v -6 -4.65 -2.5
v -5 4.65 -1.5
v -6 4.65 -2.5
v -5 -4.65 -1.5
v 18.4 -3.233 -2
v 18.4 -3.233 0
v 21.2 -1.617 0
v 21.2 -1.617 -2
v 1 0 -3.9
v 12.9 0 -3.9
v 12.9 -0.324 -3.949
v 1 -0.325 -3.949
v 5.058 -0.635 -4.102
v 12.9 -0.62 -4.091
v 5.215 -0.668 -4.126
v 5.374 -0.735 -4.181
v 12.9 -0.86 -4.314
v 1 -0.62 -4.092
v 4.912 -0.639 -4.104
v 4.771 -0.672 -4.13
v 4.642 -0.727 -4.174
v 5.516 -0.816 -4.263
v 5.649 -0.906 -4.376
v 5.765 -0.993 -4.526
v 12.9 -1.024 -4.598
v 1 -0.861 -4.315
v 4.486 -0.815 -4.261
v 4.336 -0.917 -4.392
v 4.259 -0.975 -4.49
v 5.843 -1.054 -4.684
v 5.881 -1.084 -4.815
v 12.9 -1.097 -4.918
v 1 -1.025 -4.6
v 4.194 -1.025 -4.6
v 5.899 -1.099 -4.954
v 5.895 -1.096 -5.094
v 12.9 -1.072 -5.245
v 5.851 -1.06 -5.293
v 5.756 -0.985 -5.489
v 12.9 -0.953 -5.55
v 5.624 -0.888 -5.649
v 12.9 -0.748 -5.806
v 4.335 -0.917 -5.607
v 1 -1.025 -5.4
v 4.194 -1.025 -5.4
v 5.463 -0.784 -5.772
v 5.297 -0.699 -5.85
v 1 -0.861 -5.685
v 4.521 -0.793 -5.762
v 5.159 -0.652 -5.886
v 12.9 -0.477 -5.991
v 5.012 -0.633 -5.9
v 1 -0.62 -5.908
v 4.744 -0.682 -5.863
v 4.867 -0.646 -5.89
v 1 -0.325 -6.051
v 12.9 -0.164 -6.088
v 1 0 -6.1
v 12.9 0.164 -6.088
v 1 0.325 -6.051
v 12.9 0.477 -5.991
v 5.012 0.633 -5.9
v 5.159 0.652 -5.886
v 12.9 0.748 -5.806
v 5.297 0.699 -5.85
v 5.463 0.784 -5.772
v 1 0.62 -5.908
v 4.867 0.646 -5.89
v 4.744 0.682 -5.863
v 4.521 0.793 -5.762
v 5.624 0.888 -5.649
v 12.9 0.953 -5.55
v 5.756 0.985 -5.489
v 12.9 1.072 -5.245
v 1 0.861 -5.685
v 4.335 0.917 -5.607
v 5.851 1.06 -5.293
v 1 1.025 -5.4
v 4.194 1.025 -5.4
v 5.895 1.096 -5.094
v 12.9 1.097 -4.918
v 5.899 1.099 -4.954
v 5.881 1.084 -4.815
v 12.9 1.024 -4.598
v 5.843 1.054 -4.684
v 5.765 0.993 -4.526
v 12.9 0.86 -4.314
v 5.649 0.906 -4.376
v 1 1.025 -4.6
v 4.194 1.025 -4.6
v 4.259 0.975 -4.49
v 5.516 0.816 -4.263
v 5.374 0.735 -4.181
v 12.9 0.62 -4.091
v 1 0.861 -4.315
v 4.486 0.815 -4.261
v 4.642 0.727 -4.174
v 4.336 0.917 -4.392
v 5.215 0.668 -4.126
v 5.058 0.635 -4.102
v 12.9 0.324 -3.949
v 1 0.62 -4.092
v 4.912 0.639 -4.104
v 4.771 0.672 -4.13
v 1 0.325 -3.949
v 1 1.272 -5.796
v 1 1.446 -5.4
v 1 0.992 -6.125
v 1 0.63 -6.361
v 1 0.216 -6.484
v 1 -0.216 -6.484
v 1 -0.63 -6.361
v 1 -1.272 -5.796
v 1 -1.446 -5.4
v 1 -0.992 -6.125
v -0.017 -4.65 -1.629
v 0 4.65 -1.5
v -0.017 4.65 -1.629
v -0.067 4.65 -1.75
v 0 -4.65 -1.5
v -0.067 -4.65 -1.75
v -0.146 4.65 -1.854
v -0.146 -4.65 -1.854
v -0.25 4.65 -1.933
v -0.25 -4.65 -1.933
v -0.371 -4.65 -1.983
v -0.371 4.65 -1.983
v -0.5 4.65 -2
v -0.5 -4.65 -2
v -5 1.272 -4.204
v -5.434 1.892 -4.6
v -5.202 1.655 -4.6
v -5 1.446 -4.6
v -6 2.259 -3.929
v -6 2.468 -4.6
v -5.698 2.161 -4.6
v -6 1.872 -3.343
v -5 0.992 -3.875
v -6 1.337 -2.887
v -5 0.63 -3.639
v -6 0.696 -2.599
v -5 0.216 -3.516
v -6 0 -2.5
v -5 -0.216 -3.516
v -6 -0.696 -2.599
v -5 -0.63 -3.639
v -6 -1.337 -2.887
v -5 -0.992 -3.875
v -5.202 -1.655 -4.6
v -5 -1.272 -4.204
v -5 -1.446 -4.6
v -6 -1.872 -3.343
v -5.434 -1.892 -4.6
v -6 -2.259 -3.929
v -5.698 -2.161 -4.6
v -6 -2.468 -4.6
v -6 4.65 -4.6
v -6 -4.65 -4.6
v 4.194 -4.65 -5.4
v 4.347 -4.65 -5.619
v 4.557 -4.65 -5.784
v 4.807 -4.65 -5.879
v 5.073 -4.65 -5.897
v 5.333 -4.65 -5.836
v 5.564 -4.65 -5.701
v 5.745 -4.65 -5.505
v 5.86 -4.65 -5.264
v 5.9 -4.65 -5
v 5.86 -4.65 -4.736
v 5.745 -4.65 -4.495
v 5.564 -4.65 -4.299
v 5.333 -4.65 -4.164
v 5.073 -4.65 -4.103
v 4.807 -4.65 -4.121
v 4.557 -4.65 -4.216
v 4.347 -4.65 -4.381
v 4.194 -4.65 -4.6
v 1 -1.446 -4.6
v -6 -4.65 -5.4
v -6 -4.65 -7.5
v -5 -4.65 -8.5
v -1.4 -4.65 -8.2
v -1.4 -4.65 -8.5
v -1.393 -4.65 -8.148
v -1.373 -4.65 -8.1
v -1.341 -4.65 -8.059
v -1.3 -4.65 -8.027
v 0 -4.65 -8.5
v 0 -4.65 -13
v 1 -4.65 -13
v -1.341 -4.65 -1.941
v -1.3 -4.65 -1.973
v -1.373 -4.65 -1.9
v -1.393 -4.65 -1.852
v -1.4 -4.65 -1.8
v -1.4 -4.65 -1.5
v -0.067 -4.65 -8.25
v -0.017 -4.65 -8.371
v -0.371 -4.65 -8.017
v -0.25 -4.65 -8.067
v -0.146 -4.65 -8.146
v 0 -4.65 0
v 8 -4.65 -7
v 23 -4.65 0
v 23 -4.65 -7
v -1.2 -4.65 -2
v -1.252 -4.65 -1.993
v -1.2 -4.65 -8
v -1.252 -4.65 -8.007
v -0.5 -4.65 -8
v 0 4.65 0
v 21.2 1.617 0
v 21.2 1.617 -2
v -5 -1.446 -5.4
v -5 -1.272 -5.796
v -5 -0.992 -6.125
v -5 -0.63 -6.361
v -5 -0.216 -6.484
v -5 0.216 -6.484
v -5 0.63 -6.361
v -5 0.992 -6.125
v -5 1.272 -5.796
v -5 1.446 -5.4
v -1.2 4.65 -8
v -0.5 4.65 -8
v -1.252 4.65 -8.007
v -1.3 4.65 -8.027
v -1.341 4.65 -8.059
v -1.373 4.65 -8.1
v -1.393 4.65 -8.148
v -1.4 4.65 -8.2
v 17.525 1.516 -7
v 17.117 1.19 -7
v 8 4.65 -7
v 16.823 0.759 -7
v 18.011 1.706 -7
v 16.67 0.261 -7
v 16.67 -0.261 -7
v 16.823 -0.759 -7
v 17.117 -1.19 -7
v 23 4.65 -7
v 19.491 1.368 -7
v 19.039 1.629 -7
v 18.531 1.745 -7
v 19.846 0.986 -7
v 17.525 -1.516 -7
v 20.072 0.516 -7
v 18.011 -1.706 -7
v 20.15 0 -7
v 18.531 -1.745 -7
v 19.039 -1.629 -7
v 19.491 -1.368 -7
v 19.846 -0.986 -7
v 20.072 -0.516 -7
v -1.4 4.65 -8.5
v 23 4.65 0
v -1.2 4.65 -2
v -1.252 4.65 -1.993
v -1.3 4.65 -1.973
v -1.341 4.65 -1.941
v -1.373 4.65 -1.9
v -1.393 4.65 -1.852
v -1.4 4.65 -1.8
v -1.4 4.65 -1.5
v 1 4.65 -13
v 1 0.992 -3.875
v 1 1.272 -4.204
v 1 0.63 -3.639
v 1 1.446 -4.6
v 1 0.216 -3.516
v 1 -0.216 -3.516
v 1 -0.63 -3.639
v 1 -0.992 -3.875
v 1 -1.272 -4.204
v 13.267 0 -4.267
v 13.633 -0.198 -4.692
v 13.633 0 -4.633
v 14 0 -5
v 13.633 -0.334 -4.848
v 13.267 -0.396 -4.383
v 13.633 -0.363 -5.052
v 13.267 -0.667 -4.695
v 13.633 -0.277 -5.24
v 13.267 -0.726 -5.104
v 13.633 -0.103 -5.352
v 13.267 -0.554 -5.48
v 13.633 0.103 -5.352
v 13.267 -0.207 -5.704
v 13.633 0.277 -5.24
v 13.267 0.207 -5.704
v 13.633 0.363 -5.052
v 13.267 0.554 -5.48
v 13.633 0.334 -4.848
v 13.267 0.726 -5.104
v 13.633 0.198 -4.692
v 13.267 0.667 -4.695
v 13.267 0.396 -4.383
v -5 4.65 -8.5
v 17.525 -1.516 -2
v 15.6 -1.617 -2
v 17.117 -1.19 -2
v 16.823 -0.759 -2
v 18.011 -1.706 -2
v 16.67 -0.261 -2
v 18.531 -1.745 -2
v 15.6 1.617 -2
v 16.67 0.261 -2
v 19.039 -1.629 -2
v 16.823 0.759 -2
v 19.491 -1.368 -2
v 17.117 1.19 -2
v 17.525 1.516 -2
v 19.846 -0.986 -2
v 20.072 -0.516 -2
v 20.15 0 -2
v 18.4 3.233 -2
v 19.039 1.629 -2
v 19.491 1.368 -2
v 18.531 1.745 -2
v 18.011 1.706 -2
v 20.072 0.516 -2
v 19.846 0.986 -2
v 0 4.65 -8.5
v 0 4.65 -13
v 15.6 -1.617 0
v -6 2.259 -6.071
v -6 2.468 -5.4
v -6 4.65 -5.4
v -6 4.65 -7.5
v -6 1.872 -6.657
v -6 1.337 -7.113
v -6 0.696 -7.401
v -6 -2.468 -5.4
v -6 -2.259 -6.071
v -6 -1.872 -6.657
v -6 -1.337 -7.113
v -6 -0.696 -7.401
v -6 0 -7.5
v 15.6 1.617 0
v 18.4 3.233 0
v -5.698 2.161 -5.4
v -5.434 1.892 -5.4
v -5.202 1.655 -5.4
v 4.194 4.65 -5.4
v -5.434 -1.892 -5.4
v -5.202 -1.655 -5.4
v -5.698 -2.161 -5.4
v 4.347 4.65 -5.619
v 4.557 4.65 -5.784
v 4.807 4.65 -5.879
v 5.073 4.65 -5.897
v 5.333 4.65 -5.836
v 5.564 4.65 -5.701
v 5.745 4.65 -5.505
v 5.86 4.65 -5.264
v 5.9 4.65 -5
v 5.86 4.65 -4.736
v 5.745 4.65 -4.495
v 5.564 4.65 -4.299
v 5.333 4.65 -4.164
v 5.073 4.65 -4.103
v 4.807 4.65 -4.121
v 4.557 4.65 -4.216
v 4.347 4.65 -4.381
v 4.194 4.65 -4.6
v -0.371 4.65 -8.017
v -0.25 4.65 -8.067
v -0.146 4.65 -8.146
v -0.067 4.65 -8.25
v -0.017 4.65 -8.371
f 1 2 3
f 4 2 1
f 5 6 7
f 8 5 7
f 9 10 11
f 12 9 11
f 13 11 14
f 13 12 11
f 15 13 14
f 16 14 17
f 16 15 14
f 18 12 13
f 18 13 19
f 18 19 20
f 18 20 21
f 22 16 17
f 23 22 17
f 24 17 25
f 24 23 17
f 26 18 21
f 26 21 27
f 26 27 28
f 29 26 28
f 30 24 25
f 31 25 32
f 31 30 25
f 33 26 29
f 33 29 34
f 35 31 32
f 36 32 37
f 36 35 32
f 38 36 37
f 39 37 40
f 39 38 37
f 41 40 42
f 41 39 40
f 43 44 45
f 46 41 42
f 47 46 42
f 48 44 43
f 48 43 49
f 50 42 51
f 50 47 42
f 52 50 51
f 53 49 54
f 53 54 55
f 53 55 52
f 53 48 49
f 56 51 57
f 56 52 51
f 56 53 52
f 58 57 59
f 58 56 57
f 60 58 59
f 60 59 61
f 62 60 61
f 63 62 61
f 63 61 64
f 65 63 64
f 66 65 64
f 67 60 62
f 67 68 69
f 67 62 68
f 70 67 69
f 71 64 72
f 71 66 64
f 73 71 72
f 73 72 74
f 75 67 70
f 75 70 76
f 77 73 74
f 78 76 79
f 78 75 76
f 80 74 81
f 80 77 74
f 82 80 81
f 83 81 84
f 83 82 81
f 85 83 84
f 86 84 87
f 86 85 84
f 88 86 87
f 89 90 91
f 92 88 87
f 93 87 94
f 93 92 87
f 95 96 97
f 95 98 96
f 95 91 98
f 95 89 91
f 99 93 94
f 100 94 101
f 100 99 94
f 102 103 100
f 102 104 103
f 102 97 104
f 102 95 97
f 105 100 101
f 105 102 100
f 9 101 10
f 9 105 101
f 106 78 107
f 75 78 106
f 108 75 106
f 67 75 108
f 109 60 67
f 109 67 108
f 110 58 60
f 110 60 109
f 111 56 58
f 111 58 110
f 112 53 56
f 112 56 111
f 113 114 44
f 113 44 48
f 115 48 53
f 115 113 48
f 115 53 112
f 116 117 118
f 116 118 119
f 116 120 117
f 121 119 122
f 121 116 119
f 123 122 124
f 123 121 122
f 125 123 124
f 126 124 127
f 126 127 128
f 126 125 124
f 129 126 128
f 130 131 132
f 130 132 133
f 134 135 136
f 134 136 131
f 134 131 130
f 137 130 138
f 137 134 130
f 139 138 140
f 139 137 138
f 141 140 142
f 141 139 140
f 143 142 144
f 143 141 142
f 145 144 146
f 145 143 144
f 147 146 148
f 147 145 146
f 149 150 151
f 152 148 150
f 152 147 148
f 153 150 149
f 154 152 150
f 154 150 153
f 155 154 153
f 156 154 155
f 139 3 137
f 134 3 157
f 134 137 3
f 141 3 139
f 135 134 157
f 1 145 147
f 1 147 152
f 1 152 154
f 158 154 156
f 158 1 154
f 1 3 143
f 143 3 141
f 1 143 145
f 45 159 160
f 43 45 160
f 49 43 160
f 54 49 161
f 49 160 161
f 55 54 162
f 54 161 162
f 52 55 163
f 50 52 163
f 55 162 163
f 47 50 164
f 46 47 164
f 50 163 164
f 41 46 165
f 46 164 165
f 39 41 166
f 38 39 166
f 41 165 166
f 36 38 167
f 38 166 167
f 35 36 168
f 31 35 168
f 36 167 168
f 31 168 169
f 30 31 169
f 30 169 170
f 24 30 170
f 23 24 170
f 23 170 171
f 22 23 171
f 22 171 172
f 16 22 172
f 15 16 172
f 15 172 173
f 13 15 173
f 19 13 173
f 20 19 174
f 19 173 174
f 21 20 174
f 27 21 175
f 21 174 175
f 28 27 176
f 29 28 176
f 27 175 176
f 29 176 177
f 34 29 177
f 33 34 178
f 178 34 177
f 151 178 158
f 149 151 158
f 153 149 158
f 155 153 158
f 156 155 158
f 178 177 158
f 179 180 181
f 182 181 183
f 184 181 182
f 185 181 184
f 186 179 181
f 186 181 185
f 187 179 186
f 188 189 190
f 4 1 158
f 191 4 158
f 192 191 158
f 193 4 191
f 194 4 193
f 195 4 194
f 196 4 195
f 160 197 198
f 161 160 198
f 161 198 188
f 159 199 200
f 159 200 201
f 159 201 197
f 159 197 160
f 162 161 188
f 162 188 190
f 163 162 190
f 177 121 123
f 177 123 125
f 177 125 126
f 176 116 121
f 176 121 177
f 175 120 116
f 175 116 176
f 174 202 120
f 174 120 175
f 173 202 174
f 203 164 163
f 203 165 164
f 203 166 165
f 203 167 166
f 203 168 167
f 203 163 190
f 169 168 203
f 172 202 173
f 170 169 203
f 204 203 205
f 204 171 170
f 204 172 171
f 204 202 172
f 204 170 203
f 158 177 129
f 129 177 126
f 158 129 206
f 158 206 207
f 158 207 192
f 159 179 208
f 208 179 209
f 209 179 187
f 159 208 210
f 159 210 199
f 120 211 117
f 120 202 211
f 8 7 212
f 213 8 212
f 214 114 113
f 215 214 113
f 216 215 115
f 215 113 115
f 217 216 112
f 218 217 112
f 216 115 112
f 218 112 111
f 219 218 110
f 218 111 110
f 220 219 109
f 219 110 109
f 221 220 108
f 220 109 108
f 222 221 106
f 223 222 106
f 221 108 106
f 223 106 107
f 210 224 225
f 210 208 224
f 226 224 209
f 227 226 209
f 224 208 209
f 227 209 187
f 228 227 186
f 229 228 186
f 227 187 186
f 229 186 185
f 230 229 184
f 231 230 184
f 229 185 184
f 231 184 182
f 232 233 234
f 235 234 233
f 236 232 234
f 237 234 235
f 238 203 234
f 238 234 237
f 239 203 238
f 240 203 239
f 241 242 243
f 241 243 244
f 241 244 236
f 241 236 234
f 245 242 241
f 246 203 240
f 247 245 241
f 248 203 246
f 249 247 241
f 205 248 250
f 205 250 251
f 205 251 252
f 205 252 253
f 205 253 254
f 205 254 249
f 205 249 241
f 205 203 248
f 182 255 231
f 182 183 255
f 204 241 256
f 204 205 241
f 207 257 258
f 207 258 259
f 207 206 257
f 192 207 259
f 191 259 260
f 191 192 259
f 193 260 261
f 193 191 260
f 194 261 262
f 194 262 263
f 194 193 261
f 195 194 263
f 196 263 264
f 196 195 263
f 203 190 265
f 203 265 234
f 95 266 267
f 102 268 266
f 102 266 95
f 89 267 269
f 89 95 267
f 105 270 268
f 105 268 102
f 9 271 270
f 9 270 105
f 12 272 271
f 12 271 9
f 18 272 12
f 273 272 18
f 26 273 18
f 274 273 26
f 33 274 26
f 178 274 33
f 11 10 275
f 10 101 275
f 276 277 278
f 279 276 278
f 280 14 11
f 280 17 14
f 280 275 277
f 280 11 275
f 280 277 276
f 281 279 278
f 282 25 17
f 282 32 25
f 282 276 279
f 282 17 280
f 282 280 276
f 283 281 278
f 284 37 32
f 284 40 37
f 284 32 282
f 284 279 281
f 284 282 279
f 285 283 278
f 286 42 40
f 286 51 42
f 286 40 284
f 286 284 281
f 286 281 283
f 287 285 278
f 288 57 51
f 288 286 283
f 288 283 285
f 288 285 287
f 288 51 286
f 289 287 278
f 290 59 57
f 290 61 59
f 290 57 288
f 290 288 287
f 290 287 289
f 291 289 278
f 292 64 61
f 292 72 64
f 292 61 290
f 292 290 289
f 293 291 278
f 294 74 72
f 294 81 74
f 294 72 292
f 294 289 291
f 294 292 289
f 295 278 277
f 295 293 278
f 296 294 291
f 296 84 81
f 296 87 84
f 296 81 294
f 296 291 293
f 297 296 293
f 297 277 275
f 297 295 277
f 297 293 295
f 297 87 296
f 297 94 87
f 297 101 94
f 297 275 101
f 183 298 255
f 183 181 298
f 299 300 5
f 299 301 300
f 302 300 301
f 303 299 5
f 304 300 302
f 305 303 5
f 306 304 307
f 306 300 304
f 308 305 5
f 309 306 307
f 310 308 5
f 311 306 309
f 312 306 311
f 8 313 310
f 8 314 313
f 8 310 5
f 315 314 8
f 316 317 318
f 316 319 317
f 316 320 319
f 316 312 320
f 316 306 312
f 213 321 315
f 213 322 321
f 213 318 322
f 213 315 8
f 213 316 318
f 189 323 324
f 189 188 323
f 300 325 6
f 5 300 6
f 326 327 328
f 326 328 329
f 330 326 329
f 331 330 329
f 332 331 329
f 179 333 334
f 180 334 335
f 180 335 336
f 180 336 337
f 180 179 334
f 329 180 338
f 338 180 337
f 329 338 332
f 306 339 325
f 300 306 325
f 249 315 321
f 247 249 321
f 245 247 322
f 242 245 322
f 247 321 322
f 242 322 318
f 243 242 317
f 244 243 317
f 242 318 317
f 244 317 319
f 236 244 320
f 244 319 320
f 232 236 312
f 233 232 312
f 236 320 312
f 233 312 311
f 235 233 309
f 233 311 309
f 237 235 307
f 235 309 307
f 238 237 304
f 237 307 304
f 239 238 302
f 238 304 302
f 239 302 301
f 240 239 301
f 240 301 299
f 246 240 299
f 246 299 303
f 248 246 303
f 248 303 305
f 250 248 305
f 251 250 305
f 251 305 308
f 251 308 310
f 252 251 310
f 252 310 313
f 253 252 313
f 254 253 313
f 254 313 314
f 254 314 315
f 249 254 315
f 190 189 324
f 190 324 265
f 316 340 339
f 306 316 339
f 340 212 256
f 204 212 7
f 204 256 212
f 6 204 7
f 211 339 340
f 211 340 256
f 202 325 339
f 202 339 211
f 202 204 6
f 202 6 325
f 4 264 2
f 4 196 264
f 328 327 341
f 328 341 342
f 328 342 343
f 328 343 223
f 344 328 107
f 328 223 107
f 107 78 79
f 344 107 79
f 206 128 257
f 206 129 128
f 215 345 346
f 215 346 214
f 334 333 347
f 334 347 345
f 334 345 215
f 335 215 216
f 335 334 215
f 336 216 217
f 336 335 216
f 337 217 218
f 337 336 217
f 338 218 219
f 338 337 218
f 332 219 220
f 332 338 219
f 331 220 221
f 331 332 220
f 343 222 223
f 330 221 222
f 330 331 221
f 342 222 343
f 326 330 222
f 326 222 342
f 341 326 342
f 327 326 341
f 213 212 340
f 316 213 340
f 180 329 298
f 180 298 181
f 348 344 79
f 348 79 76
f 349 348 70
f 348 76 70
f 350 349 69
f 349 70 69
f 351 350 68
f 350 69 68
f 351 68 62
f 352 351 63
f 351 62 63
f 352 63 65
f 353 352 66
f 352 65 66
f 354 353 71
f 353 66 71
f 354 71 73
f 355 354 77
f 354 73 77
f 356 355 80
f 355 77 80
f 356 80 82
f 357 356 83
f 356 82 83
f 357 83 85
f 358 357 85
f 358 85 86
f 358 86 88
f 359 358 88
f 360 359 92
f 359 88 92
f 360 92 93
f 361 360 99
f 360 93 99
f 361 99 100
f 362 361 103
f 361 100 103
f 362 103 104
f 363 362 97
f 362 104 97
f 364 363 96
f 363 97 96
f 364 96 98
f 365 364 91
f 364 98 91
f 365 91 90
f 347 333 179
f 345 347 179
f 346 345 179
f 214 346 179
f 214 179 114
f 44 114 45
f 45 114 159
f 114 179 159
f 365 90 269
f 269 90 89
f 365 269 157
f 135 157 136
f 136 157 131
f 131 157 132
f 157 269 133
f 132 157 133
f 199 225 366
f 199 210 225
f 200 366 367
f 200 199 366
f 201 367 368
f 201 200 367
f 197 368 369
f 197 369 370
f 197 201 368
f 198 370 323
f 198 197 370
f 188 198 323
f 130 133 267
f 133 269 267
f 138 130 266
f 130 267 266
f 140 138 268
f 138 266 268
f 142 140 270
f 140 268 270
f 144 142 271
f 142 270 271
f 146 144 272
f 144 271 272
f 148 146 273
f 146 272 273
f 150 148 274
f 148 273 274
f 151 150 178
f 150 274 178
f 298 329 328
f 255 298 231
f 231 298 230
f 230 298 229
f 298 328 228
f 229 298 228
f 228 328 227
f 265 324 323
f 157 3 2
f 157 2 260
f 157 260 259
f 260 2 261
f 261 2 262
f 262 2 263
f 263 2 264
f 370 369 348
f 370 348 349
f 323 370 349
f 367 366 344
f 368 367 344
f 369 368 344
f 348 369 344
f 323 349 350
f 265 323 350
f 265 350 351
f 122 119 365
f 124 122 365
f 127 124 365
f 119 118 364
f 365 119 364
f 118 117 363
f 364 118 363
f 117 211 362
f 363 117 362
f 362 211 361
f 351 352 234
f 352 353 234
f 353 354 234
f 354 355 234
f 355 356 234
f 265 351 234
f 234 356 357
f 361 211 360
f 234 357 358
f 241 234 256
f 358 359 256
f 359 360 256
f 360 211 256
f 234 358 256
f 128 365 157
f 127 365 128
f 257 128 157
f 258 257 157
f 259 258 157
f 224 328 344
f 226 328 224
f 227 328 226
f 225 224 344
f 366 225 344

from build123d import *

# Parameters (mm, degrees)
F1_DEPTH = 4.65
F2_R     = 1.75
F3_DEPTH = 13.001
F4_DEPTH = 2
F8_DEPTH = 12.5
F9_SIZE  = 0.99999
F10_R    = 0.5
F11_R    = 0.2
F12_W    = 7
F12_H    = 1.5


# Not quite as in the source:
# - a fillet or chamfer is up to 0.001 mm smaller than in the source, because OpenCascade refuses the exact size


with BuildPart() as f1:
    # F0 (on Front) → F1 (new body, symmetric)
    with BuildSketch(Plane.XZ):
        Polygon((23, 0), (0, 0), (0, -1.5), (0, -2), (-1.4, -2), (-1.4, -1.5), (-6, -1.5), (-6, -8.5), (-1.4, -8.5), (-1.4, -8), (0, -8), (0, -8.5), (0, -13), (1, -13), (8, -7), (23, -7), align=None)
    extrude(amount=F1_DEPTH, both=True)

    # F2 (on face) → F3 (cut, through all)
    with BuildSketch(Plane.XY):
        with Locations((18.4, 0)):
            Circle(F2_R)
    extrude(amount=-F3_DEPTH, mode=Mode.SUBTRACT)

    # F2 (on face) → F4 (cut)
    with BuildSketch(Plane.XY):
        Polygon((18.4, 3.2331615075), (15.6, 1.6165807537), (15.6, -1.6165807537), (18.4, -3.2331615075), (21.2, -1.6165807537), (21.2, 1.6165807537), align=None)
        with Locations((18.4, 0)):
            Circle(F2_R, mode=Mode.SUBTRACT)
    extrude(amount=-F4_DEPTH, mode=Mode.SUBTRACT)

    # F5 (on Front) → F6 (revolve, cut)
    with BuildSketch(Plane.XZ):
        Polygon((-6, -2.5), (-6, -5), (14, -5), (12.9, -3.9), (-4.6, -3.9), align=None)
    revolve(axis=Axis((22.399994296, 0, -5), (1, 0, 0)), mode=Mode.SUBTRACT)

    # F7 (on Front) → F8 (cut, symmetric)
    with BuildSketch(Plane.XZ):
        with BuildLine():
            ThreePointArc((4.1937742252, -5.4), (5.2054224947, -5.8762428879), (5.9, -5))
            ThreePointArc((5.9, -5), (5.2054224947, -4.1237571121), (4.1937742252, -4.6))
            ThreePointArc((4.1937742252, -4.6), (4.1, -5), (4.1937742252, -5.4))
        make_face()
        with BuildLine():
            ThreePointArc((4.1937742252, -5.4), (4.1, -5), (4.1937742252, -4.6))
            Line((4.1937742252, -4.6), (-6, -4.6))
            Line((-6, -4.6), (-6, -5.4))
            Line((-6, -5.4), (4.1937742252, -5.4))
        make_face()
    extrude(amount=F8_DEPTH, both=True, mode=Mode.SUBTRACT)

    # F9 (size 1 in the source; OpenCascade refuses exactly that, so slightly less here)
    f9_edges = [f1.edges().sort_by_distance(p)[0] for p in [
        (-6, 0, -8.5),
        (-6, 0, -1.5),
    ]]
    chamfer(f9_edges, length=F9_SIZE)

    # F10
    f10_edges = [f1.edges().sort_by_distance(p)[0] for p in [
        (0, 0, -2),
        (0, 0, -8),
    ]]
    fillet(f10_edges, radius=F10_R)

    # F11
    f11_edges = [f1.edges().sort_by_distance(p)[0] for p in [
        (-1.4, 0, -2),
        (-1.4, 0, -8),
    ]]
    fillet(f11_edges, radius=F11_R)

    # F12 (on Front) → F13 (revolve, cut)
    with BuildSketch(Plane.XZ):
        with Locations((-2.5, -4.25)):
            Rectangle(F12_W, F12_H)
    revolve(axis=Axis((4, 0, -5), (1, 0, 0)), mode=Mode.SUBTRACT)


solid = f1.part
